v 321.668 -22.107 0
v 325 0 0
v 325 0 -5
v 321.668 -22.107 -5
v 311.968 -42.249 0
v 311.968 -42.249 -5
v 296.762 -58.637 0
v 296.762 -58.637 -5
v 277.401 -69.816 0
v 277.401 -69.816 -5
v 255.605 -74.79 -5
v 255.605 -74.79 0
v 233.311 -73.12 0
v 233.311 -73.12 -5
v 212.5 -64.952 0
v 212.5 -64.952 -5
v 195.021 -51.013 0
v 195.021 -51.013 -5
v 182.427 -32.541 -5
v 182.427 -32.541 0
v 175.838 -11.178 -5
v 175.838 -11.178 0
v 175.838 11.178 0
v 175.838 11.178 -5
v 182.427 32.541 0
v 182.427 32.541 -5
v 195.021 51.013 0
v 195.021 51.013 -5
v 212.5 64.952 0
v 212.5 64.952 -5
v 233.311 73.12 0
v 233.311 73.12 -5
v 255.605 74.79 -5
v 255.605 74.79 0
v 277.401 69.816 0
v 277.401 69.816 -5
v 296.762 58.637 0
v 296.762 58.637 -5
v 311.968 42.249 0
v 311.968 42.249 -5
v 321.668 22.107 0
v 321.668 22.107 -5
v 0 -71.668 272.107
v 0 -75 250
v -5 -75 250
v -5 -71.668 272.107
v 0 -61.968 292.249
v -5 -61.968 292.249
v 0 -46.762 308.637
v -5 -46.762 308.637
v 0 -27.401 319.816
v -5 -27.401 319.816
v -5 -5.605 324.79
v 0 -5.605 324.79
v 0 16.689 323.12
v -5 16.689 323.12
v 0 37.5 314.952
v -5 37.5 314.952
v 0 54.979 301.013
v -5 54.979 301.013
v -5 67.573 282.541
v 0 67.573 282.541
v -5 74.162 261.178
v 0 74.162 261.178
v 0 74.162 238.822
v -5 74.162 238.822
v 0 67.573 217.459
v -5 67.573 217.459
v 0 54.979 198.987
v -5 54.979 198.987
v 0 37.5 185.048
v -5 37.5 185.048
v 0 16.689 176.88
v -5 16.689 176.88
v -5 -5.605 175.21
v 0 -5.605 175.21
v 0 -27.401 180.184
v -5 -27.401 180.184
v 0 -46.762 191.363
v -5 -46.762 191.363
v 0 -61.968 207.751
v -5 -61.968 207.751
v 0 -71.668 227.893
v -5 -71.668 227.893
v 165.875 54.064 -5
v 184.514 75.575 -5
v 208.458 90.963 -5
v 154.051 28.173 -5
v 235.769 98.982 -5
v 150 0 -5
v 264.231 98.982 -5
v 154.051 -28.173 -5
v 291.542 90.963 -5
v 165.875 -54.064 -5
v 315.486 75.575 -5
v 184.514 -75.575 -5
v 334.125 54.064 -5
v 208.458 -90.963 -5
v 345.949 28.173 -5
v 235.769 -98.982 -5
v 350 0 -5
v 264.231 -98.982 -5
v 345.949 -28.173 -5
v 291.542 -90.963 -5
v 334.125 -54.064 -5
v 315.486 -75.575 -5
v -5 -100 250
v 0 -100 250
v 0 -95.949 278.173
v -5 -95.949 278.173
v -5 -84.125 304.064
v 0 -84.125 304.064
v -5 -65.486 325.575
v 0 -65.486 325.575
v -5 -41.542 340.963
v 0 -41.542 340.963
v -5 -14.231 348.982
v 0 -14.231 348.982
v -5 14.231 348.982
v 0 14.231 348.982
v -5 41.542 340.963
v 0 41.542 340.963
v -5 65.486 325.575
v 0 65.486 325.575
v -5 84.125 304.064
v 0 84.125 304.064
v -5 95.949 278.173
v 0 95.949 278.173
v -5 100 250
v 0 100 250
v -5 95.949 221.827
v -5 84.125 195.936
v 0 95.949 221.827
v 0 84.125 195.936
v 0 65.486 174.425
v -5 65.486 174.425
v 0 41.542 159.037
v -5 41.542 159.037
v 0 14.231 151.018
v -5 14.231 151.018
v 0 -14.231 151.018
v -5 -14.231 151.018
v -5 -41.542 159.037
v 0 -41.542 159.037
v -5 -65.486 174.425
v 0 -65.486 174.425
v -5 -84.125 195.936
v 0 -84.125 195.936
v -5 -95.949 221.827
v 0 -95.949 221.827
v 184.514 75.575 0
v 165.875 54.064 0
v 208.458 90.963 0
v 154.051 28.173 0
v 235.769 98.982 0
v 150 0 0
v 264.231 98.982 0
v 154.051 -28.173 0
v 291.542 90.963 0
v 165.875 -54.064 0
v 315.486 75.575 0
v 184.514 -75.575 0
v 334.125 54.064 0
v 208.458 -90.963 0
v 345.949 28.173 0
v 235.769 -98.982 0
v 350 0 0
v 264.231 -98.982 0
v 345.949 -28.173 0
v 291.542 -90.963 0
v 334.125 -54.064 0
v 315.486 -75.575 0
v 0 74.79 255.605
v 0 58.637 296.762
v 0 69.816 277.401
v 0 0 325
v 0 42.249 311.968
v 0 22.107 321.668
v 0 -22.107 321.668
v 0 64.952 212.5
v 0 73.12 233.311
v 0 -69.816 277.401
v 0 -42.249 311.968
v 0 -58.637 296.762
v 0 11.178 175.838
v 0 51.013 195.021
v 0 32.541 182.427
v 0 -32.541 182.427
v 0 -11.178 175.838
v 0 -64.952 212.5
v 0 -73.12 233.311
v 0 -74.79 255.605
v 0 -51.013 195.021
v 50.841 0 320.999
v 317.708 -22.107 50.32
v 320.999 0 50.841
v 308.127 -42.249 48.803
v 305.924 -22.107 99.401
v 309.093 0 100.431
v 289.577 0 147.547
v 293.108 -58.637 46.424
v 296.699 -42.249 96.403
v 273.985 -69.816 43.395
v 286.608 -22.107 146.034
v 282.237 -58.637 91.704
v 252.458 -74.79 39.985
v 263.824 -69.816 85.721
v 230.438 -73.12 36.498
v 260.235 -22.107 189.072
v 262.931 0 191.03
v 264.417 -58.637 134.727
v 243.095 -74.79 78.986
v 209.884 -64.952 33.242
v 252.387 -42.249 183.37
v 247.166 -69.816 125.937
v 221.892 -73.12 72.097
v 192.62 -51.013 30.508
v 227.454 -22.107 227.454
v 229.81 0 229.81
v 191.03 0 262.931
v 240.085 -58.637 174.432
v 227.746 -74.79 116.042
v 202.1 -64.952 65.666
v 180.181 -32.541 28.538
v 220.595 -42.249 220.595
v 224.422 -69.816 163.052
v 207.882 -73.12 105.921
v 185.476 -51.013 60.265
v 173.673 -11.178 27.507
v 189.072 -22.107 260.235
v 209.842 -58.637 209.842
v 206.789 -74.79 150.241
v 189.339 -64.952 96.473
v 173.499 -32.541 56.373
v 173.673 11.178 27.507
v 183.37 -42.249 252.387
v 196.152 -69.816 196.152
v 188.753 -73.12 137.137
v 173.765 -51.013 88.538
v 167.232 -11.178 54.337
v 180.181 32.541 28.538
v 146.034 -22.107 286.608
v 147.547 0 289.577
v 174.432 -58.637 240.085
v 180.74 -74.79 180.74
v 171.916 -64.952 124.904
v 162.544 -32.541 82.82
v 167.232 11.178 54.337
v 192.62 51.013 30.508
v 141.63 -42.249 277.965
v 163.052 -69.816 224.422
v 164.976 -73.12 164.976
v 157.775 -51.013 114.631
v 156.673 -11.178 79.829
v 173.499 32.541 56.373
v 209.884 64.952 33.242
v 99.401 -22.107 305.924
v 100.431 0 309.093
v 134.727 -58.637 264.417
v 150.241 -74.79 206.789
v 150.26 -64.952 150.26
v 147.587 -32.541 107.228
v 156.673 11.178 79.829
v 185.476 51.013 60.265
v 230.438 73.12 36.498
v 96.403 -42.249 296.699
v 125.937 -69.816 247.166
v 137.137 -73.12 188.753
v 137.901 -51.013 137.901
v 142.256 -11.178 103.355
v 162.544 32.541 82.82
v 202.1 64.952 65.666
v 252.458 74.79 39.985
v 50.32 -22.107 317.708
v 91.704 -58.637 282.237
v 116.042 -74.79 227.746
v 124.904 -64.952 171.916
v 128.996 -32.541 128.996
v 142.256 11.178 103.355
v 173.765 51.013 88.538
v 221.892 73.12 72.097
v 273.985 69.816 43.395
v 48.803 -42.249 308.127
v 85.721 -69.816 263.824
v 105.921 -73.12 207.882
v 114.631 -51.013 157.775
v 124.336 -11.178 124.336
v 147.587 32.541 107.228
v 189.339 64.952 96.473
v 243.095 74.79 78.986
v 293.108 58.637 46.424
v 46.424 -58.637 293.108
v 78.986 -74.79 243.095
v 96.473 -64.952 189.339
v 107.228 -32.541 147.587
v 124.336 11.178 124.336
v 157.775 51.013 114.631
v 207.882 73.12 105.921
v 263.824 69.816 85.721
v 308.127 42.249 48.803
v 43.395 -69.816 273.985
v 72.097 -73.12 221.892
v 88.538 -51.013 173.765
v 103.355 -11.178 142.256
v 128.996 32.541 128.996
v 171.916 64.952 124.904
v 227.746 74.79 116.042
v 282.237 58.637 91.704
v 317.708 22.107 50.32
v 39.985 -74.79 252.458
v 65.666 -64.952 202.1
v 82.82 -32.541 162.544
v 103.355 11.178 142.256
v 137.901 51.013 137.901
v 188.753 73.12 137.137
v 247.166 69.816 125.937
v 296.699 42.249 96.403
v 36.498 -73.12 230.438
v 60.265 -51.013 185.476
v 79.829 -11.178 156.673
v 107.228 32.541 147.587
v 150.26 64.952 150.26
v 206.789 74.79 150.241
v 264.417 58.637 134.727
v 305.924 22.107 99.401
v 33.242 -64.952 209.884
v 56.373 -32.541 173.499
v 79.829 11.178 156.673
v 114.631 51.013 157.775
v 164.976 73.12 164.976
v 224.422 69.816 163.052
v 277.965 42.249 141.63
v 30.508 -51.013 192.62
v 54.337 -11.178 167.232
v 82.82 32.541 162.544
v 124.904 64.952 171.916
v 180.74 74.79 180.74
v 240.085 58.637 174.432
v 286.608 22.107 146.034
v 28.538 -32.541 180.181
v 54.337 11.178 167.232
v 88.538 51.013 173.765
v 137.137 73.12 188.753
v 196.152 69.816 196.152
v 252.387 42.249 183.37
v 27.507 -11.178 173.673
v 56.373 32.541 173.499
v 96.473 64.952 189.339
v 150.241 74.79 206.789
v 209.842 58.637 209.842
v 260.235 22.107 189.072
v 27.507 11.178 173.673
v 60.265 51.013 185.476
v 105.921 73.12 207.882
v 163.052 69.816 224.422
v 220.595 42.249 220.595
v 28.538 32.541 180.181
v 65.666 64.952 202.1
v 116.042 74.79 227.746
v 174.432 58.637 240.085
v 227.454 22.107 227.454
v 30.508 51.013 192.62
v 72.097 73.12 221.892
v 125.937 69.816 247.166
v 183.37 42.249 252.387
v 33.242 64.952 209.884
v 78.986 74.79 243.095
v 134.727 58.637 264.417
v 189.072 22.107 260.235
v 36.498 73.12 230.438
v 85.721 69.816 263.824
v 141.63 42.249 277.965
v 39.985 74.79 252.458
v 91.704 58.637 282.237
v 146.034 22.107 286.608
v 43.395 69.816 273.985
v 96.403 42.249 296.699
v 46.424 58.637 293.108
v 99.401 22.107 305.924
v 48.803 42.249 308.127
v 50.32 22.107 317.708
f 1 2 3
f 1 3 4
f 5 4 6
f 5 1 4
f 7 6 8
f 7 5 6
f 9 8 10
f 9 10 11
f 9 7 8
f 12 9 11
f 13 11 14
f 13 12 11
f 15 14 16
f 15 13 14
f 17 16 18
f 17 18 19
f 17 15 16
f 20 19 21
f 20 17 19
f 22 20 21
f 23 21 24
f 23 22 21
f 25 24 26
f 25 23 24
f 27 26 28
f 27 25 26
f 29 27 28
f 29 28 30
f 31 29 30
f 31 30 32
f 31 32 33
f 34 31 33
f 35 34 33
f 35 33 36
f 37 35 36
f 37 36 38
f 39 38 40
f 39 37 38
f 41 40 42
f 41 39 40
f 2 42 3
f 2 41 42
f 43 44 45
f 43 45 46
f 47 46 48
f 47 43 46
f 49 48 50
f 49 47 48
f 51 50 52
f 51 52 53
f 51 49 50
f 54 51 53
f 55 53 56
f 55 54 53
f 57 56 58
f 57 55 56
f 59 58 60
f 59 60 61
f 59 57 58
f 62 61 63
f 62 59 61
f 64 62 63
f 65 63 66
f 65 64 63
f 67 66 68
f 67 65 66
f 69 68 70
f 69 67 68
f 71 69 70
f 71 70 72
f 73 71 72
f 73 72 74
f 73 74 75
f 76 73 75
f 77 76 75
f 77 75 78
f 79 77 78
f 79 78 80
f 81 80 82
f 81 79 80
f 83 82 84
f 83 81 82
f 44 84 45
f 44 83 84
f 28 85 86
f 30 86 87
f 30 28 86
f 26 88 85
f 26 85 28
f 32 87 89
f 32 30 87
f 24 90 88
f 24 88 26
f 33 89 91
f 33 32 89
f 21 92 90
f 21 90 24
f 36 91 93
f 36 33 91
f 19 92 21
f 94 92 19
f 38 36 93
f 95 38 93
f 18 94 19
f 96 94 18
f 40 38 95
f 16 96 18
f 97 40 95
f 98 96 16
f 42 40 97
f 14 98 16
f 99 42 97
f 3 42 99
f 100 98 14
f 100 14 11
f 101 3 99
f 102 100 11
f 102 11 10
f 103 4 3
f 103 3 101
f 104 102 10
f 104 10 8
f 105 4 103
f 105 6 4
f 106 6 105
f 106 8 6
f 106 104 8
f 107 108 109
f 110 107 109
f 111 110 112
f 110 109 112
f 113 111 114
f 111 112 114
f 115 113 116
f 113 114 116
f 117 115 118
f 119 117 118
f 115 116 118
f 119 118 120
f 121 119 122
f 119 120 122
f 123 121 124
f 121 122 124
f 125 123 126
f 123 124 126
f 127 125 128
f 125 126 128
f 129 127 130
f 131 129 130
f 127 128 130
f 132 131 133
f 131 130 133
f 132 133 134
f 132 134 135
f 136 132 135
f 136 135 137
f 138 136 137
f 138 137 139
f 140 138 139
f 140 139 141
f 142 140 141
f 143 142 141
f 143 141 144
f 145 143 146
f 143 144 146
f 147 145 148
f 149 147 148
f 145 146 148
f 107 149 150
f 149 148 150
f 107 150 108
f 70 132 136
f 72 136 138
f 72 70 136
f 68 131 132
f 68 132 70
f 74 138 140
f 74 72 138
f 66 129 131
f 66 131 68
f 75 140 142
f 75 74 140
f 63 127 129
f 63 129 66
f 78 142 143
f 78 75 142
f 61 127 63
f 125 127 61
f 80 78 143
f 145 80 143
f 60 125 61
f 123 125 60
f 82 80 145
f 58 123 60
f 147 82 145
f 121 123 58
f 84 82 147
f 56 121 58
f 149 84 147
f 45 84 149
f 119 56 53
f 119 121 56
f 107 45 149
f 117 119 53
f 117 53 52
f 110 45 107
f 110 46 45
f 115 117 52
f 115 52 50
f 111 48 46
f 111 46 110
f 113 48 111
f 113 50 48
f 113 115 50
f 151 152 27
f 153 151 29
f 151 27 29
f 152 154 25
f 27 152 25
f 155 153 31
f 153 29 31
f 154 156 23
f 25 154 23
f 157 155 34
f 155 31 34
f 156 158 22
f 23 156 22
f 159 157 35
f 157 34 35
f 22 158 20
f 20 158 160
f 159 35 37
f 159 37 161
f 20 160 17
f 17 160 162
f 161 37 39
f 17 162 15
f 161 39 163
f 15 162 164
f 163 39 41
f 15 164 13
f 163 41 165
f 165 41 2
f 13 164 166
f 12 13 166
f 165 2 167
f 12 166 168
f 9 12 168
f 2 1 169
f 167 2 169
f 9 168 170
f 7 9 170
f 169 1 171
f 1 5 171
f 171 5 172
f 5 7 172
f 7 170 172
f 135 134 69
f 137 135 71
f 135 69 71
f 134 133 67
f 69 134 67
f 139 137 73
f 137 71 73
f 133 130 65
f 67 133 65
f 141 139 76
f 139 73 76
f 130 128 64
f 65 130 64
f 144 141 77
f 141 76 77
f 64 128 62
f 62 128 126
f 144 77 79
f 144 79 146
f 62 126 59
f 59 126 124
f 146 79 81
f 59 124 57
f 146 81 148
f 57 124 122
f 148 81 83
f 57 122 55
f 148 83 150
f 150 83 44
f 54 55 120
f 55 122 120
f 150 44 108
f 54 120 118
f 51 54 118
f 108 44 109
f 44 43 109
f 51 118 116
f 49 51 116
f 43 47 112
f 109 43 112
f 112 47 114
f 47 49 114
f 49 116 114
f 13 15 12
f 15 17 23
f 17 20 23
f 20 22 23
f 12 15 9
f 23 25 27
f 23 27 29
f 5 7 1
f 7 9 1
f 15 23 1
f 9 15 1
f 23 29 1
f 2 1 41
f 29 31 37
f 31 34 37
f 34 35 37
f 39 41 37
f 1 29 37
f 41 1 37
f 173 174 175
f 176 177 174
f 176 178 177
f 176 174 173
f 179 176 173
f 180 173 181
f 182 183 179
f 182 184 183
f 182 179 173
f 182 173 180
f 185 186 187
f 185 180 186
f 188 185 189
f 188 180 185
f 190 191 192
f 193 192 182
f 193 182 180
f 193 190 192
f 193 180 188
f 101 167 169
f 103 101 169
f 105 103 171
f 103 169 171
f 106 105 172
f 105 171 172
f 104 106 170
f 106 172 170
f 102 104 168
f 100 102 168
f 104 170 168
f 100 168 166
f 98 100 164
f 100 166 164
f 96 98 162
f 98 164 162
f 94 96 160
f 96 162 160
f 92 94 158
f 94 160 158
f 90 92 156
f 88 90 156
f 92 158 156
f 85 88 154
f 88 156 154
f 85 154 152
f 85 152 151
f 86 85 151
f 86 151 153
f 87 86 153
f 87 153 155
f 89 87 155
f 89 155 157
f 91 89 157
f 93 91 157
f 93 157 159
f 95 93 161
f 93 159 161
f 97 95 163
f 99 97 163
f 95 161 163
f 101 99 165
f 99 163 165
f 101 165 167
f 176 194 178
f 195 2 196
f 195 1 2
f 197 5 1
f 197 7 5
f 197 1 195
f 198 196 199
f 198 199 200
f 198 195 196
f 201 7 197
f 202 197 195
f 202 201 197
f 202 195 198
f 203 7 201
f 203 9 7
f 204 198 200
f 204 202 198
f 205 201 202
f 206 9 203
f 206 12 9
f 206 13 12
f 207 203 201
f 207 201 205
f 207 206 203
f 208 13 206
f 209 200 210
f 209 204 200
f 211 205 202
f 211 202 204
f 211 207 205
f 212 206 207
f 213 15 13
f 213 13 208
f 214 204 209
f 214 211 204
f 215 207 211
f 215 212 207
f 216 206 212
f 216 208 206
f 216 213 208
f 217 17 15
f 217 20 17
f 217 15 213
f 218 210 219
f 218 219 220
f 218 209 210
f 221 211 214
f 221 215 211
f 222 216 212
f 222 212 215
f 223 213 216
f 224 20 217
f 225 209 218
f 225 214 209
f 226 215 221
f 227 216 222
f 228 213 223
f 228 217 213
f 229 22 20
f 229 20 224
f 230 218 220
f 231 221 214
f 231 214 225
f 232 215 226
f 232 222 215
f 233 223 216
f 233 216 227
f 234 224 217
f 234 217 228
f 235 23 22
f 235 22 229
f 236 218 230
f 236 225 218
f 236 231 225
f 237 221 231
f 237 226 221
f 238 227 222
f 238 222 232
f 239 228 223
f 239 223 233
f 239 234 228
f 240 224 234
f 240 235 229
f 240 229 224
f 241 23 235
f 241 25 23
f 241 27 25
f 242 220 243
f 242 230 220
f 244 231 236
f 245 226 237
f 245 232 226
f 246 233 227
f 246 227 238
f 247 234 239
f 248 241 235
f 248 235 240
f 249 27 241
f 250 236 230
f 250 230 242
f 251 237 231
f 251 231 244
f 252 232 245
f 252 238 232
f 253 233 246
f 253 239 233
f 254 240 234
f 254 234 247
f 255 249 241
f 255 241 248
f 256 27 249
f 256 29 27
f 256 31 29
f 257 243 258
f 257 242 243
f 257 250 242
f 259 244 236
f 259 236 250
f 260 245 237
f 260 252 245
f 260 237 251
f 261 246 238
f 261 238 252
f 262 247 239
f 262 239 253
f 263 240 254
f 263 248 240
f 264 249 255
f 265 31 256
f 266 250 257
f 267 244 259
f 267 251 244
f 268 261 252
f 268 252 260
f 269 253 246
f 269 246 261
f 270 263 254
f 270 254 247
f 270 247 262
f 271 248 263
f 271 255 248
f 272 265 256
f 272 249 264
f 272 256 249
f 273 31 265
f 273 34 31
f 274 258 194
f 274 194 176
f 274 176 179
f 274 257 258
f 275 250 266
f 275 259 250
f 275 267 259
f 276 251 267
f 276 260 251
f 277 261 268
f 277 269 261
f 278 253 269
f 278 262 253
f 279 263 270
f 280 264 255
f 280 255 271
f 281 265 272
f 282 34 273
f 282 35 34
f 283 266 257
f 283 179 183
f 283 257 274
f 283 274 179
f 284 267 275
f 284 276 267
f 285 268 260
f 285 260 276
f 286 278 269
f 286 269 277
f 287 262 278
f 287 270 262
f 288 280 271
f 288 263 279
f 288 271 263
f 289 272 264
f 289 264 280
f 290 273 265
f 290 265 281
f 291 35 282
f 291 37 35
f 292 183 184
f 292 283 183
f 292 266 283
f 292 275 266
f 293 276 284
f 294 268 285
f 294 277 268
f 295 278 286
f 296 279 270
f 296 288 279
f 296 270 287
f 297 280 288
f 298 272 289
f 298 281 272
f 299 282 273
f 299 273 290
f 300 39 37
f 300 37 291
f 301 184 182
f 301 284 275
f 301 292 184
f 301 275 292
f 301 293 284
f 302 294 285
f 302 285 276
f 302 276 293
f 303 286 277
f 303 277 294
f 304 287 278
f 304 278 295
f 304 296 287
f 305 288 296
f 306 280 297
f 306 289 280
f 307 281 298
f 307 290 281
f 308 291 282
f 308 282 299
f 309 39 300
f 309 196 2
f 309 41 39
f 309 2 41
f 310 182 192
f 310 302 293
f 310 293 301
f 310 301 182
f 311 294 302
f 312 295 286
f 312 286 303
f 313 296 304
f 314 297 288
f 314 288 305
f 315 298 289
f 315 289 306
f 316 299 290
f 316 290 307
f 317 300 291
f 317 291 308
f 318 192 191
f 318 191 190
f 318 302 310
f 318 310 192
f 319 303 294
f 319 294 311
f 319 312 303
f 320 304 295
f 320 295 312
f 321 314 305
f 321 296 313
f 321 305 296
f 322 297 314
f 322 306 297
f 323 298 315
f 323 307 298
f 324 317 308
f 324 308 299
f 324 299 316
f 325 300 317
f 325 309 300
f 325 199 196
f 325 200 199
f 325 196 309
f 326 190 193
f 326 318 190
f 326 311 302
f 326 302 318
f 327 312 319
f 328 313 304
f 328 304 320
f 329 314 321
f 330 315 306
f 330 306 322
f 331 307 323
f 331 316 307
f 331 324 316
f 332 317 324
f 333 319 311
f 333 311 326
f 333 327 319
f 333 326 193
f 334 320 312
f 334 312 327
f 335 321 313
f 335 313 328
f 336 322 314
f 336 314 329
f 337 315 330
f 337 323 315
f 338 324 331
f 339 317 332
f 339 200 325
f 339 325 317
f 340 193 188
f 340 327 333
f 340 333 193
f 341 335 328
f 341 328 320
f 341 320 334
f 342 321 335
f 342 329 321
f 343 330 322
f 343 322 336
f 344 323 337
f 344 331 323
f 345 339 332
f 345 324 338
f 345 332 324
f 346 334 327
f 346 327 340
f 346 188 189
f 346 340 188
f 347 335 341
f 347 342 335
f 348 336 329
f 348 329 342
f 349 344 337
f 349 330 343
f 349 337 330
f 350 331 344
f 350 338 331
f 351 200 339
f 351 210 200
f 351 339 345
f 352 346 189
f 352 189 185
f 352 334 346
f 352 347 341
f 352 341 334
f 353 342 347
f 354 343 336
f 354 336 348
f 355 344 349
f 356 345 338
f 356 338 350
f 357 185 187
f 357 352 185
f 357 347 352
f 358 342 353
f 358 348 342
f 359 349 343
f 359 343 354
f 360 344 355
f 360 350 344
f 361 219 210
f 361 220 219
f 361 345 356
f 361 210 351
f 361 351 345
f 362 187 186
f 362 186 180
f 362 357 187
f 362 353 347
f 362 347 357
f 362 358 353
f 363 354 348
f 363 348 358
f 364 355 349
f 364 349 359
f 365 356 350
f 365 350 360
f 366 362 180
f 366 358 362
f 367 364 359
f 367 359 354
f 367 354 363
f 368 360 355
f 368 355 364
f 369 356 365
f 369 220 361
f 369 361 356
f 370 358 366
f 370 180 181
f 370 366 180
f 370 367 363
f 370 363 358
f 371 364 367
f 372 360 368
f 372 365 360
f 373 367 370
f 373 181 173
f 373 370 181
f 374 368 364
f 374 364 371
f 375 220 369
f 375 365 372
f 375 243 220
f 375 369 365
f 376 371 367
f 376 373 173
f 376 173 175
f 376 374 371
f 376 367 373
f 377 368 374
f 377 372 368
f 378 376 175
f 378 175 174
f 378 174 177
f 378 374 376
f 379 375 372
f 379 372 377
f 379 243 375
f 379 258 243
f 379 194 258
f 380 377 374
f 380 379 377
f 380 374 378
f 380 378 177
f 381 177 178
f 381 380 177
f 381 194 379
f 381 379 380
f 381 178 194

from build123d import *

# Parameters (mm, degrees)
F1_R     = 75
F3_R     = 100
F3_R_2   = 75
F4_DEPTH = 5
F5_R     = 100
F5_R_2   = 75
F6_DEPTH = 5


with BuildPart() as f2:
    # F2: sweep along a path in F0
    with BuildLine(Plane.XZ) as f2_path:
        ThreePointArc((250, 0), (176.7766952966, 176.7766952966), (0, 250))
    # F1 (on Top) → F2 (sweep)
    with BuildSketch(Plane.XY):
        with Locations((250, 0)):
            Circle(F1_R)
    sweep(path=f2_path.line)


with BuildPart() as f4:
    # F3 (on face) → F4 (new body)
    with BuildSketch(Plane(origin=(0, 0, 0), x_dir=(1, 0, 0), z_dir=(0, 0, -1))):
        with Locations((250, 0)):
            Circle(F3_R)
        with Locations((250, 0)):
            Circle(F3_R_2, mode=Mode.SUBTRACT)
    extrude(amount=F4_DEPTH)


with BuildPart() as f6:
    # F5 (on face) → F6 (new body)
    with BuildSketch(Plane(origin=(0, 0, 0), x_dir=(0, -1, 0), z_dir=(-1, 0, 0))):
        with Locations((0, 250)):
            Circle(F5_R)
        with Locations((0, 250)):
            Circle(F5_R_2, mode=Mode.SUBTRACT)
    extrude(amount=F6_DEPTH)


solid = Compound([f2.part, f4.part, f6.part])
